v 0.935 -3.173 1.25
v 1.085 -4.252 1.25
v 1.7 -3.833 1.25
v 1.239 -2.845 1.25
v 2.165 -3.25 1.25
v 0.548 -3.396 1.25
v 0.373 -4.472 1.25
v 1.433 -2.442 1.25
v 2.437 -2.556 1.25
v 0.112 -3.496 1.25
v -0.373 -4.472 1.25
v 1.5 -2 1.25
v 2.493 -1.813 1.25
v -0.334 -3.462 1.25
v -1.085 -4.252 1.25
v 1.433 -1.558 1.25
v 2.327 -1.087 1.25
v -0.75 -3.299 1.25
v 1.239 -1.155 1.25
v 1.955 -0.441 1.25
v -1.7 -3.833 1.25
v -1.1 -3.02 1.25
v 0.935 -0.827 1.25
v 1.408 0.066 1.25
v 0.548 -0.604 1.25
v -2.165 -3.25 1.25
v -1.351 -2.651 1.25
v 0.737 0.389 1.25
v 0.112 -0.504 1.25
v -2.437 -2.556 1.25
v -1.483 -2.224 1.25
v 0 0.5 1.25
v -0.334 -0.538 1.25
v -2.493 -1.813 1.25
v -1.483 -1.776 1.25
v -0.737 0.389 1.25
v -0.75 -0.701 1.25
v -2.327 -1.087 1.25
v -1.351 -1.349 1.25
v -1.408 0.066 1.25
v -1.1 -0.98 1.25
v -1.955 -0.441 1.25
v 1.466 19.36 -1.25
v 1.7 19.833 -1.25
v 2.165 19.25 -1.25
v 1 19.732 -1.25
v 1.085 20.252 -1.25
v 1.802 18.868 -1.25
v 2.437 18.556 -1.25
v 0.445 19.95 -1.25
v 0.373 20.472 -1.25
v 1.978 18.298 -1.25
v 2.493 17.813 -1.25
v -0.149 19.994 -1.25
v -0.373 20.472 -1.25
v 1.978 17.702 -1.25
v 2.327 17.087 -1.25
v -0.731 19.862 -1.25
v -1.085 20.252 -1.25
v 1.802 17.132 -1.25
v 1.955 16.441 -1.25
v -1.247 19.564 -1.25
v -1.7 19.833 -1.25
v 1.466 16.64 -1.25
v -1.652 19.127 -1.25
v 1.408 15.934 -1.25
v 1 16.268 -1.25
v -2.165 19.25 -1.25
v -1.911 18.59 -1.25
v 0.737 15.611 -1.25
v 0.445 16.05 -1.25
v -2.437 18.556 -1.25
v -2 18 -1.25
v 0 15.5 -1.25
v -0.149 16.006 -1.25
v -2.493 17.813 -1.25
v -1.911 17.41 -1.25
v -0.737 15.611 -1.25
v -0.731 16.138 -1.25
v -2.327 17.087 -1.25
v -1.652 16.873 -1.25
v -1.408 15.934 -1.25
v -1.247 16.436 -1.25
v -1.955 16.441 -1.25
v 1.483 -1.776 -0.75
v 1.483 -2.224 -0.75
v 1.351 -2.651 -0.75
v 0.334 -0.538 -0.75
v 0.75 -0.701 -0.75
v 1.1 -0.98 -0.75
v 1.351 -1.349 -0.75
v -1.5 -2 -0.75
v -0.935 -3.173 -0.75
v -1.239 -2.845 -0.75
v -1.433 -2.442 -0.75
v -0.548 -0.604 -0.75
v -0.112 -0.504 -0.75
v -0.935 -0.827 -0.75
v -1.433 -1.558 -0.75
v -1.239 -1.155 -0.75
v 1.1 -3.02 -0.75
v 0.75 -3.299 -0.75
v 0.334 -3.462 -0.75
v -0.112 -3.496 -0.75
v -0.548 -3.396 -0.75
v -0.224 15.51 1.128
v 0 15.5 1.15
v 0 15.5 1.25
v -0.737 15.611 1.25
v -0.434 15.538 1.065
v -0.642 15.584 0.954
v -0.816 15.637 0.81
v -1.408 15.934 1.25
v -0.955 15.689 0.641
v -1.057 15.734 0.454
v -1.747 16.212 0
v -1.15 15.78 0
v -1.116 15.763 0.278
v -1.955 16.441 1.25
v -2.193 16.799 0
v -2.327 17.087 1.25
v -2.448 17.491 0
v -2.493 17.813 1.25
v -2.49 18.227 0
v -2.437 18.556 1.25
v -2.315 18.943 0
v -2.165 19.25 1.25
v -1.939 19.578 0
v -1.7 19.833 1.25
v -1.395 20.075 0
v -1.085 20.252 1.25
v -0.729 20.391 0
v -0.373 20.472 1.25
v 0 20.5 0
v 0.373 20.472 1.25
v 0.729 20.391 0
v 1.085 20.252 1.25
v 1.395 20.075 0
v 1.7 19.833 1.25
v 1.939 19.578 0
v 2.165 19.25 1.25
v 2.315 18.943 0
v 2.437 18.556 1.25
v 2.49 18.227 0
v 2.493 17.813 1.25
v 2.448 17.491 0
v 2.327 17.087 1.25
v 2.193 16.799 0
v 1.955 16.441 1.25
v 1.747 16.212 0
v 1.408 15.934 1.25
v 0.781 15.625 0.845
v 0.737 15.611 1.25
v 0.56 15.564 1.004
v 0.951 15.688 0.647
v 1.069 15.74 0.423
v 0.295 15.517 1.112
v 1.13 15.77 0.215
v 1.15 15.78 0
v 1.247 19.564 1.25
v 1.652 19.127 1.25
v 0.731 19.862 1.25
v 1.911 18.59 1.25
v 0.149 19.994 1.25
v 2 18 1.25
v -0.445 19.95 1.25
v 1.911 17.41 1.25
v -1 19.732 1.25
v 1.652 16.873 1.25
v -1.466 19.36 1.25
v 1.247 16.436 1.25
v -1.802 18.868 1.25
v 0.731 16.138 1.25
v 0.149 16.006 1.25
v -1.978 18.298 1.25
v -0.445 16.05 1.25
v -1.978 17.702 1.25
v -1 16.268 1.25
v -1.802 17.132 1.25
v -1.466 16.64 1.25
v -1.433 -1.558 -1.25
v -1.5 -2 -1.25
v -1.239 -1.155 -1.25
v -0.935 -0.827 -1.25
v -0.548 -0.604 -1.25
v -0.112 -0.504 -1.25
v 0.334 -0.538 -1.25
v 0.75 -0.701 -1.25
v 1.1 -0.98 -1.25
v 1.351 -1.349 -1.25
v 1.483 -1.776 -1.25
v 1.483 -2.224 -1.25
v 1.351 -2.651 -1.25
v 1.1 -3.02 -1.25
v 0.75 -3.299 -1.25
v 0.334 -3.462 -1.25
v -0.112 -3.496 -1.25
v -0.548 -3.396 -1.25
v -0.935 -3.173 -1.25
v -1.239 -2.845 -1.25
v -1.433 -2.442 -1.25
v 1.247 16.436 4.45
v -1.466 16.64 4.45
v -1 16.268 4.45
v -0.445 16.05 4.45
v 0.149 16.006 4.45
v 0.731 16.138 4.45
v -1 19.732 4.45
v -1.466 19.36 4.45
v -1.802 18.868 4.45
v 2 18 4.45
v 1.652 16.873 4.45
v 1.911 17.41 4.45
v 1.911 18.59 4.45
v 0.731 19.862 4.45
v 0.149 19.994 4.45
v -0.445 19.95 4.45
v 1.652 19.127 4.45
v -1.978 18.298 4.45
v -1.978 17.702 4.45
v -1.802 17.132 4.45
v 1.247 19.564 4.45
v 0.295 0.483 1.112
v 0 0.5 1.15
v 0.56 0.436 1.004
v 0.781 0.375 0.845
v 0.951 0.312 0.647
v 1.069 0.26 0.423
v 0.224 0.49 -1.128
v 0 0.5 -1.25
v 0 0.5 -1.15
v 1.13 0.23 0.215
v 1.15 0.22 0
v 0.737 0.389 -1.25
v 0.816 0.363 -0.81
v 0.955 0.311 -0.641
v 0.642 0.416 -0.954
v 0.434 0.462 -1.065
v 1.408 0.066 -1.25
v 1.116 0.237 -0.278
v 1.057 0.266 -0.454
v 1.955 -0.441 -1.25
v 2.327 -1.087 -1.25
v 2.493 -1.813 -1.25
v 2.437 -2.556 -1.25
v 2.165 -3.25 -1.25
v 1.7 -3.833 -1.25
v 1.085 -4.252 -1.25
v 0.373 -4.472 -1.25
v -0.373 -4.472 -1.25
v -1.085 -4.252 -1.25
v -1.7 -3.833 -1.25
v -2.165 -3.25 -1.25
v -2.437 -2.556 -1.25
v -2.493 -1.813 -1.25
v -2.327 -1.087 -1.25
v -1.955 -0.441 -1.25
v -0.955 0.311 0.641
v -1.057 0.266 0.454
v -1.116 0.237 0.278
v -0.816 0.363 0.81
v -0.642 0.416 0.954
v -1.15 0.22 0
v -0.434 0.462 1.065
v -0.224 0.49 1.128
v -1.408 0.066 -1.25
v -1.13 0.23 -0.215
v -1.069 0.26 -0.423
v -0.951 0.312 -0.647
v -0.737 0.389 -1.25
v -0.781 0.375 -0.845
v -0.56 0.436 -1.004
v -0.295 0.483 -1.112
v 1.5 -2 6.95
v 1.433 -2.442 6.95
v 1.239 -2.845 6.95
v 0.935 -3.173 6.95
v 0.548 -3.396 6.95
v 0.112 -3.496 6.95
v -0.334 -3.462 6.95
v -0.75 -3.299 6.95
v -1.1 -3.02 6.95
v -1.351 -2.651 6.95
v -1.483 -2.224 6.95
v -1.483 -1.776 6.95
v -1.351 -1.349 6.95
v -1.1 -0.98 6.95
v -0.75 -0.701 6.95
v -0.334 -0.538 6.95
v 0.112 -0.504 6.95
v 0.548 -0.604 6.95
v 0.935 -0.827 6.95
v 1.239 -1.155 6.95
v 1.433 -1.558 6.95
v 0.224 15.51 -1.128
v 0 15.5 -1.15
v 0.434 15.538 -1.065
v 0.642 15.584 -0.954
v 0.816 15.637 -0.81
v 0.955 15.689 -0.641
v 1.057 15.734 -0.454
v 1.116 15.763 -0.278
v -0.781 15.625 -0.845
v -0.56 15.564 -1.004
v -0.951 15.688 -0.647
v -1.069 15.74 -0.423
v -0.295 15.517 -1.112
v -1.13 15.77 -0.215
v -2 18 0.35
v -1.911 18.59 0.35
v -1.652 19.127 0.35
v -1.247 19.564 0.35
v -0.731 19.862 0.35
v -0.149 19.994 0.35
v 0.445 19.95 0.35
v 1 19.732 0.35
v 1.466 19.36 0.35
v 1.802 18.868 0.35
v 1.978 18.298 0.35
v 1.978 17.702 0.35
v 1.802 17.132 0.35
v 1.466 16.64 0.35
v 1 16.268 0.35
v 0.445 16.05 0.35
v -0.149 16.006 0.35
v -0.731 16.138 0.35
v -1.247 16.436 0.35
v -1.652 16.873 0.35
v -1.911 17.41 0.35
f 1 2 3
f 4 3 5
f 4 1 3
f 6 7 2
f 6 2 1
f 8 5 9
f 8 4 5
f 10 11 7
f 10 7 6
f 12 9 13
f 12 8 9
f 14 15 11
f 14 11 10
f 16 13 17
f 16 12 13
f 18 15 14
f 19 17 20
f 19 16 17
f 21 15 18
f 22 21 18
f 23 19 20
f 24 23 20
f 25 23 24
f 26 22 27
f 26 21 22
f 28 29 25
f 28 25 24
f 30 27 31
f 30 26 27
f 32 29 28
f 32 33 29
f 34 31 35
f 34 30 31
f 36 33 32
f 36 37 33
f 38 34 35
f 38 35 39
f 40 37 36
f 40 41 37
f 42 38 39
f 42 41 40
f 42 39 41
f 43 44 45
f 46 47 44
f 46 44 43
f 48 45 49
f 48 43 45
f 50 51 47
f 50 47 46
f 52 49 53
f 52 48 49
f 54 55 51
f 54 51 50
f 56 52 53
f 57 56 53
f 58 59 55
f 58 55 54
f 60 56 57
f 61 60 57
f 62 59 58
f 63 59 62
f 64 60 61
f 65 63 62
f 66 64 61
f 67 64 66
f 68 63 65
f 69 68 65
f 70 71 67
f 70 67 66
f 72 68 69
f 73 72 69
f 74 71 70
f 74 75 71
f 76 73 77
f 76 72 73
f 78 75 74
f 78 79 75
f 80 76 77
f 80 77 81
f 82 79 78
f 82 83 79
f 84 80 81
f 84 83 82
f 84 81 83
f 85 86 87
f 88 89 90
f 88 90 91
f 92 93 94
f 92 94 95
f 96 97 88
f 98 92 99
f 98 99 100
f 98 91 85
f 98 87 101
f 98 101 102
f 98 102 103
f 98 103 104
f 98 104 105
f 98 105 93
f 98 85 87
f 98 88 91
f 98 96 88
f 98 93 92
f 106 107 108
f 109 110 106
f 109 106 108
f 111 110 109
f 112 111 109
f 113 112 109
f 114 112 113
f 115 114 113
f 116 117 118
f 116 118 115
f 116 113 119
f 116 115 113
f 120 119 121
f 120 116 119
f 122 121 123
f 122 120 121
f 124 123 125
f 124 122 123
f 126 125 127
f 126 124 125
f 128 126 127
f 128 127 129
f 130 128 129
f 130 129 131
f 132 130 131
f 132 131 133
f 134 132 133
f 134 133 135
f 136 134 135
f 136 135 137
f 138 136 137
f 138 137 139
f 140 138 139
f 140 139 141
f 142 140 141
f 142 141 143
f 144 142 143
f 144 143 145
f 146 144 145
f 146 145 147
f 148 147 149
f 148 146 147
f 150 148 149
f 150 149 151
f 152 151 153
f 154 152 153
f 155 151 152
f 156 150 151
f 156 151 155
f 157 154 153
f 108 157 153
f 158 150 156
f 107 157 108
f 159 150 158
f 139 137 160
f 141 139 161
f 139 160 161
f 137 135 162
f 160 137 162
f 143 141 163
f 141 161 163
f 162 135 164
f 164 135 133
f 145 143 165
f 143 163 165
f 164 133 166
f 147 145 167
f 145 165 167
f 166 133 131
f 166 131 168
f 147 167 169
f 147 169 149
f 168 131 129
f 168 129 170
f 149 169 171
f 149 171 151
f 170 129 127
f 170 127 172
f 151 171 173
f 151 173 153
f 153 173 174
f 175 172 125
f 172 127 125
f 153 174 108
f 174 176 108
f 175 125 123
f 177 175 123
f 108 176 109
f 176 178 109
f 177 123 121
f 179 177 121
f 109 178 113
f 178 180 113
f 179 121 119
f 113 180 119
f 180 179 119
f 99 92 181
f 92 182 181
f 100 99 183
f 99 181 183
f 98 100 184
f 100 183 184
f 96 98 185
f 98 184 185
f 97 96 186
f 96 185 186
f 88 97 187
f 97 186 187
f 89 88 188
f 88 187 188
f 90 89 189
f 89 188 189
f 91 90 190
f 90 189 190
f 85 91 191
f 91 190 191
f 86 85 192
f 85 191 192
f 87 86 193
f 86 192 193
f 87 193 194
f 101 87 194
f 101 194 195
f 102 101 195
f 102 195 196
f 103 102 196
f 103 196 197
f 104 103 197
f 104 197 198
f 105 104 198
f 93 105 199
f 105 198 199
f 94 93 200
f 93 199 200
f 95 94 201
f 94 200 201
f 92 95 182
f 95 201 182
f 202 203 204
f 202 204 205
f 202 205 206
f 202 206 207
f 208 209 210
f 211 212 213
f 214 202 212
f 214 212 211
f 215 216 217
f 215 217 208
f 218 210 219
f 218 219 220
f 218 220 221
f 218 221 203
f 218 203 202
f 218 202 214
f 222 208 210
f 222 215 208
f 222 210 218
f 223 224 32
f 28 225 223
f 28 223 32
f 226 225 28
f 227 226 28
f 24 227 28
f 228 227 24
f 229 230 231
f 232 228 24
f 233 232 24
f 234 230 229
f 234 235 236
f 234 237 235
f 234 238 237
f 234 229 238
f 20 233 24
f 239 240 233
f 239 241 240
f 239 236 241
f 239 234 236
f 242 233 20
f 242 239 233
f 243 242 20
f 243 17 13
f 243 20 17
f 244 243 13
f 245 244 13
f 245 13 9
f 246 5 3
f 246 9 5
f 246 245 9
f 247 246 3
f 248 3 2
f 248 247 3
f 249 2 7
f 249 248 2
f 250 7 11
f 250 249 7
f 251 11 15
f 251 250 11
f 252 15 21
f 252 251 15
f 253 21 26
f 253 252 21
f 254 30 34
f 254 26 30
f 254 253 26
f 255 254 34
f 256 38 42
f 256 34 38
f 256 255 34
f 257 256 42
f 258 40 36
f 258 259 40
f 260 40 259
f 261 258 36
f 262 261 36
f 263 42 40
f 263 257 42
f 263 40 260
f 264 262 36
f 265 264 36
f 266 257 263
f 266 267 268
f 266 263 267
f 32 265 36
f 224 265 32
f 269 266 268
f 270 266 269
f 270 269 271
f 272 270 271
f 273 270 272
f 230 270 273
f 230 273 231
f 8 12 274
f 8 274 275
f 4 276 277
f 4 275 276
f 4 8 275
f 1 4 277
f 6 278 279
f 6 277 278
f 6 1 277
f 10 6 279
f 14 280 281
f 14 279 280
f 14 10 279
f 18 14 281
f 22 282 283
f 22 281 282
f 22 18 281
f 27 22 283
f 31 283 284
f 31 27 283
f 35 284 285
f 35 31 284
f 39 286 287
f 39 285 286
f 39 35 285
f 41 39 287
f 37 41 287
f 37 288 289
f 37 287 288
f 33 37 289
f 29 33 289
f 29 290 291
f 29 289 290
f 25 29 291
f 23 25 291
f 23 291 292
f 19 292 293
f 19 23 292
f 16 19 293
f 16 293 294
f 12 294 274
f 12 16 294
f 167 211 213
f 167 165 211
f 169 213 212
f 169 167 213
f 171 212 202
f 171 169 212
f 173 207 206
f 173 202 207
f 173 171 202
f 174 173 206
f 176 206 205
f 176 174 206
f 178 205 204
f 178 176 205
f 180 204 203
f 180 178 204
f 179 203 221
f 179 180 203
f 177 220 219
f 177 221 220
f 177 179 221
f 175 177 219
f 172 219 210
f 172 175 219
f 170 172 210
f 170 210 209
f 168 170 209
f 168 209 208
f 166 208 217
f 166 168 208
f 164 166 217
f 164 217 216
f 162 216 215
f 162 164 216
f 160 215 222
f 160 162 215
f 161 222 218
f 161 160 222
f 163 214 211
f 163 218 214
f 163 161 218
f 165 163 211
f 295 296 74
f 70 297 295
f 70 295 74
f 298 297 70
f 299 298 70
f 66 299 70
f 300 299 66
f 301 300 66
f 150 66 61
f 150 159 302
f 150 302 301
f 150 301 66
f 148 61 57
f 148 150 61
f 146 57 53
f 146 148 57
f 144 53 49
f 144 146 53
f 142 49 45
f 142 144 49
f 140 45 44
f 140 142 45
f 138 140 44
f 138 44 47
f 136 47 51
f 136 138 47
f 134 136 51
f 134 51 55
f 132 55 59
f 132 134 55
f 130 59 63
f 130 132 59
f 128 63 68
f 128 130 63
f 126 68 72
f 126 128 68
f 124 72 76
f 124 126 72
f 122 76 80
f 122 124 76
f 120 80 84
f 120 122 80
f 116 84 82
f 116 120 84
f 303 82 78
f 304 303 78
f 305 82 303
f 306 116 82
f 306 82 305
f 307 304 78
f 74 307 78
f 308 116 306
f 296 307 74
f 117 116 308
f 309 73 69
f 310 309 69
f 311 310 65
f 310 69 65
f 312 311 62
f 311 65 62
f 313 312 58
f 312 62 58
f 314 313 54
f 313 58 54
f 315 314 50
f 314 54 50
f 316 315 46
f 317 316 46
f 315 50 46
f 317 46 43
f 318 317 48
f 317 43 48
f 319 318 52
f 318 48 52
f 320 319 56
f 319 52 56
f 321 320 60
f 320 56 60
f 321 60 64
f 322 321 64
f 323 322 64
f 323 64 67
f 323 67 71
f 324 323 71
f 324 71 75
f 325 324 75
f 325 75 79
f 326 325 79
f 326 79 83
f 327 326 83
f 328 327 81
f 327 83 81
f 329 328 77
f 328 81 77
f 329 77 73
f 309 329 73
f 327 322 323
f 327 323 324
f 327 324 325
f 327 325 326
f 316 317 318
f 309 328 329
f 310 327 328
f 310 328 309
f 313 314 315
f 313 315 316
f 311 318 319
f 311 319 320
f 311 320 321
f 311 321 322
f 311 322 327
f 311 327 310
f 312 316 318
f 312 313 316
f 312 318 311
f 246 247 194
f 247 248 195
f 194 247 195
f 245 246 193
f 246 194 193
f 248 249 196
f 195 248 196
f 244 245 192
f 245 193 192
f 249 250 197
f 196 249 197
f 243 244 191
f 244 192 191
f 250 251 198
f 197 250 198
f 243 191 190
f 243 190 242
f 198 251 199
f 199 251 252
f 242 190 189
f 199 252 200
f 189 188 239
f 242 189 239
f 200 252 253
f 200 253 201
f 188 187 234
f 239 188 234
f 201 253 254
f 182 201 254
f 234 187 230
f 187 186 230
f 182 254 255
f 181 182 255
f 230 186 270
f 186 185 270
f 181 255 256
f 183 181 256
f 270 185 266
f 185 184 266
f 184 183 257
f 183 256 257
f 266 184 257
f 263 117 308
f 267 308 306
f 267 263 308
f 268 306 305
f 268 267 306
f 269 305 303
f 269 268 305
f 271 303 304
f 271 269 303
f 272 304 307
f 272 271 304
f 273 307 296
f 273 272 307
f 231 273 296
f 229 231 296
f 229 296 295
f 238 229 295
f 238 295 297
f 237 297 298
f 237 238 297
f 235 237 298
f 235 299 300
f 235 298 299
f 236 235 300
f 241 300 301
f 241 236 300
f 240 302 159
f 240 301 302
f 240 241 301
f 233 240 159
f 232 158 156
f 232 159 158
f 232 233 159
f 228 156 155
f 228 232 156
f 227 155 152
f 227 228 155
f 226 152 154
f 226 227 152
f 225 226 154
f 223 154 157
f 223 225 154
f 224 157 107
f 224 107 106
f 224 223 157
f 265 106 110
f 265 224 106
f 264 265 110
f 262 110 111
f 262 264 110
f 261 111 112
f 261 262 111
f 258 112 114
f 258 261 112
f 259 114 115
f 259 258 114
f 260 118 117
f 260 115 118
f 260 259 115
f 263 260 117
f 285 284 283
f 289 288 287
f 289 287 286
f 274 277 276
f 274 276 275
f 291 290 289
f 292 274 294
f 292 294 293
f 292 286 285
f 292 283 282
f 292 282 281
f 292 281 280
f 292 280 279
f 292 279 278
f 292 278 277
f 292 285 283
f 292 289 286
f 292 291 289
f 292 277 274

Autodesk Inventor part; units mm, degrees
ref_plane "YZ Plane" through (0, 0, 0) normal (1, 0, 0) x (0, 1, 0)
ref_plane "XZ Plane" through (0, 0, 0) normal (0, 1, 0) x (-1, 0, 0)
ref_plane "XY Plane" through (0, 0, 0) normal (0, 0, 1) x (1, 0, 0)
sketch "Sketch1" plane through (0, 0, 0) normal (0, 1, 0) x (-1, 0, 0)
  circle A0 centre (0, 0) radius 1.15
  dimension "d0" = 2.3
extrude "Extrusion1" add sketch "Sketch1" along normal blind 16
sketch "Sketch2" plane through (0, 0, 0) normal (1, 0, 0) x (0, 1, 0)
  line L0 (16, -1.15) -> (16, 1.15) projected
  line L1 (15.5, 1.25) -> (15.5, 0)
  line L2 (16, 0) -> (15.5, 0)
  line L3 (15.5, 0) -> (13.7557, 0)
  line L4 (15.5, 1.25) -> (18, 1.25)
  line L5 (18, 1.25) -> (18, 0)
  line L6 (16, 1.15) -> (16, -1.15)
  line L7 (15.5, -1.25) -> (15.5, 0)
  line L8 (15.5, -1.25) -> (18, -1.25)
  line L9 (18, -1.25) -> (18, 0)
  point P0 (0, 0)
  dimension "d3" = 0.5
  dimension "d4" = 1.25
  dimension "d7" = 2.5
revolve "Revolution1" add sketch "Sketch2" angle 360 about axis through (0, 18, 1.25) along (0, 0, -1)
sketch "Sketch3" plane through (0, 18, 1.25) normal (0, 0, 1) x (1, 0, 0)
  circle A0 centre (0, 0) radius 2.5 projected
  circle A1 centre (0, 0) radius 2
  point P0 (0, -18)
  dimension "d9" = 4
extrude "Extrusion2" add sketch "Sketch3" along normal blind 3.2 contours A1
sketch "Sketch4" plane through (0, 18, -1.25) normal (0, 0, -1) x (-1, 0, 0)
  circle A0 centre (0, 0) radius 2 projected
  point P0 (0, -18)
extrude "Extrusion3" cut sketch "Sketch4" against normal blind 1.6
sketch "Sketch5" plane through (0, 0, 0) normal (1, 0, 0) x (0, 1, 0)
  line L0 (0.5, 0) -> (0.5, -1.25)
  line L1 (0, 1.15) -> (0, -1.15) projected
  line L2 (0, 0) -> (0.5, 0)
  line L3 (0.5, 0) -> (1.4582, 0)
  line L4 (0.5, 0) -> (0.5, -1.25)
  line L5 (-2, 0) -> (-2, -1.25)
  line L6 (0.5, -1.25) -> (-2, -1.25)
  line L7 (0.5, 0) -> (0.5, 1.25)
  line L8 (0, -1.15) -> (0, 1.15)
  line L9 (0.5, 0) -> (0.5, 1.25)
  line L10 (-2, 0) -> (-2, 1.25)
  line L11 (0.5, 1.25) -> (-2, 1.25)
  dimension "d14" = 0.5
  dimension "d15" = 1.25
  dimension "d16" = 2.5
revolve "Revolution2" add sketch "Sketch5" angle 360 about axis through (0, -2, 0) along (0, 0, 1)
sketch "Sketch6" plane through (0, -2, 1.25) normal (0, 0, 1) x (1, 0, 0)
  circle A0 centre (0, 0) radius 2.5 projected
  circle A1 centre (0, 0) radius 1.5
  point P0 (0, 2)
  dimension "d18" = 3
extrude "Extrusion4" add sketch "Sketch6" along normal blind 5.7 contours A1
sketch "Sketch7" plane through (0, -2, -1.25) normal (0, 0, -1) x (-1, 0, 0)
  circle A0 centre (0, 0) radius 1.5 projected
  point P0 (0, 2)
extrude "Extrusion5" cut sketch "Sketch7" against normal blind 0.5
properties part number "101-03" material "Aluminum 6061"
